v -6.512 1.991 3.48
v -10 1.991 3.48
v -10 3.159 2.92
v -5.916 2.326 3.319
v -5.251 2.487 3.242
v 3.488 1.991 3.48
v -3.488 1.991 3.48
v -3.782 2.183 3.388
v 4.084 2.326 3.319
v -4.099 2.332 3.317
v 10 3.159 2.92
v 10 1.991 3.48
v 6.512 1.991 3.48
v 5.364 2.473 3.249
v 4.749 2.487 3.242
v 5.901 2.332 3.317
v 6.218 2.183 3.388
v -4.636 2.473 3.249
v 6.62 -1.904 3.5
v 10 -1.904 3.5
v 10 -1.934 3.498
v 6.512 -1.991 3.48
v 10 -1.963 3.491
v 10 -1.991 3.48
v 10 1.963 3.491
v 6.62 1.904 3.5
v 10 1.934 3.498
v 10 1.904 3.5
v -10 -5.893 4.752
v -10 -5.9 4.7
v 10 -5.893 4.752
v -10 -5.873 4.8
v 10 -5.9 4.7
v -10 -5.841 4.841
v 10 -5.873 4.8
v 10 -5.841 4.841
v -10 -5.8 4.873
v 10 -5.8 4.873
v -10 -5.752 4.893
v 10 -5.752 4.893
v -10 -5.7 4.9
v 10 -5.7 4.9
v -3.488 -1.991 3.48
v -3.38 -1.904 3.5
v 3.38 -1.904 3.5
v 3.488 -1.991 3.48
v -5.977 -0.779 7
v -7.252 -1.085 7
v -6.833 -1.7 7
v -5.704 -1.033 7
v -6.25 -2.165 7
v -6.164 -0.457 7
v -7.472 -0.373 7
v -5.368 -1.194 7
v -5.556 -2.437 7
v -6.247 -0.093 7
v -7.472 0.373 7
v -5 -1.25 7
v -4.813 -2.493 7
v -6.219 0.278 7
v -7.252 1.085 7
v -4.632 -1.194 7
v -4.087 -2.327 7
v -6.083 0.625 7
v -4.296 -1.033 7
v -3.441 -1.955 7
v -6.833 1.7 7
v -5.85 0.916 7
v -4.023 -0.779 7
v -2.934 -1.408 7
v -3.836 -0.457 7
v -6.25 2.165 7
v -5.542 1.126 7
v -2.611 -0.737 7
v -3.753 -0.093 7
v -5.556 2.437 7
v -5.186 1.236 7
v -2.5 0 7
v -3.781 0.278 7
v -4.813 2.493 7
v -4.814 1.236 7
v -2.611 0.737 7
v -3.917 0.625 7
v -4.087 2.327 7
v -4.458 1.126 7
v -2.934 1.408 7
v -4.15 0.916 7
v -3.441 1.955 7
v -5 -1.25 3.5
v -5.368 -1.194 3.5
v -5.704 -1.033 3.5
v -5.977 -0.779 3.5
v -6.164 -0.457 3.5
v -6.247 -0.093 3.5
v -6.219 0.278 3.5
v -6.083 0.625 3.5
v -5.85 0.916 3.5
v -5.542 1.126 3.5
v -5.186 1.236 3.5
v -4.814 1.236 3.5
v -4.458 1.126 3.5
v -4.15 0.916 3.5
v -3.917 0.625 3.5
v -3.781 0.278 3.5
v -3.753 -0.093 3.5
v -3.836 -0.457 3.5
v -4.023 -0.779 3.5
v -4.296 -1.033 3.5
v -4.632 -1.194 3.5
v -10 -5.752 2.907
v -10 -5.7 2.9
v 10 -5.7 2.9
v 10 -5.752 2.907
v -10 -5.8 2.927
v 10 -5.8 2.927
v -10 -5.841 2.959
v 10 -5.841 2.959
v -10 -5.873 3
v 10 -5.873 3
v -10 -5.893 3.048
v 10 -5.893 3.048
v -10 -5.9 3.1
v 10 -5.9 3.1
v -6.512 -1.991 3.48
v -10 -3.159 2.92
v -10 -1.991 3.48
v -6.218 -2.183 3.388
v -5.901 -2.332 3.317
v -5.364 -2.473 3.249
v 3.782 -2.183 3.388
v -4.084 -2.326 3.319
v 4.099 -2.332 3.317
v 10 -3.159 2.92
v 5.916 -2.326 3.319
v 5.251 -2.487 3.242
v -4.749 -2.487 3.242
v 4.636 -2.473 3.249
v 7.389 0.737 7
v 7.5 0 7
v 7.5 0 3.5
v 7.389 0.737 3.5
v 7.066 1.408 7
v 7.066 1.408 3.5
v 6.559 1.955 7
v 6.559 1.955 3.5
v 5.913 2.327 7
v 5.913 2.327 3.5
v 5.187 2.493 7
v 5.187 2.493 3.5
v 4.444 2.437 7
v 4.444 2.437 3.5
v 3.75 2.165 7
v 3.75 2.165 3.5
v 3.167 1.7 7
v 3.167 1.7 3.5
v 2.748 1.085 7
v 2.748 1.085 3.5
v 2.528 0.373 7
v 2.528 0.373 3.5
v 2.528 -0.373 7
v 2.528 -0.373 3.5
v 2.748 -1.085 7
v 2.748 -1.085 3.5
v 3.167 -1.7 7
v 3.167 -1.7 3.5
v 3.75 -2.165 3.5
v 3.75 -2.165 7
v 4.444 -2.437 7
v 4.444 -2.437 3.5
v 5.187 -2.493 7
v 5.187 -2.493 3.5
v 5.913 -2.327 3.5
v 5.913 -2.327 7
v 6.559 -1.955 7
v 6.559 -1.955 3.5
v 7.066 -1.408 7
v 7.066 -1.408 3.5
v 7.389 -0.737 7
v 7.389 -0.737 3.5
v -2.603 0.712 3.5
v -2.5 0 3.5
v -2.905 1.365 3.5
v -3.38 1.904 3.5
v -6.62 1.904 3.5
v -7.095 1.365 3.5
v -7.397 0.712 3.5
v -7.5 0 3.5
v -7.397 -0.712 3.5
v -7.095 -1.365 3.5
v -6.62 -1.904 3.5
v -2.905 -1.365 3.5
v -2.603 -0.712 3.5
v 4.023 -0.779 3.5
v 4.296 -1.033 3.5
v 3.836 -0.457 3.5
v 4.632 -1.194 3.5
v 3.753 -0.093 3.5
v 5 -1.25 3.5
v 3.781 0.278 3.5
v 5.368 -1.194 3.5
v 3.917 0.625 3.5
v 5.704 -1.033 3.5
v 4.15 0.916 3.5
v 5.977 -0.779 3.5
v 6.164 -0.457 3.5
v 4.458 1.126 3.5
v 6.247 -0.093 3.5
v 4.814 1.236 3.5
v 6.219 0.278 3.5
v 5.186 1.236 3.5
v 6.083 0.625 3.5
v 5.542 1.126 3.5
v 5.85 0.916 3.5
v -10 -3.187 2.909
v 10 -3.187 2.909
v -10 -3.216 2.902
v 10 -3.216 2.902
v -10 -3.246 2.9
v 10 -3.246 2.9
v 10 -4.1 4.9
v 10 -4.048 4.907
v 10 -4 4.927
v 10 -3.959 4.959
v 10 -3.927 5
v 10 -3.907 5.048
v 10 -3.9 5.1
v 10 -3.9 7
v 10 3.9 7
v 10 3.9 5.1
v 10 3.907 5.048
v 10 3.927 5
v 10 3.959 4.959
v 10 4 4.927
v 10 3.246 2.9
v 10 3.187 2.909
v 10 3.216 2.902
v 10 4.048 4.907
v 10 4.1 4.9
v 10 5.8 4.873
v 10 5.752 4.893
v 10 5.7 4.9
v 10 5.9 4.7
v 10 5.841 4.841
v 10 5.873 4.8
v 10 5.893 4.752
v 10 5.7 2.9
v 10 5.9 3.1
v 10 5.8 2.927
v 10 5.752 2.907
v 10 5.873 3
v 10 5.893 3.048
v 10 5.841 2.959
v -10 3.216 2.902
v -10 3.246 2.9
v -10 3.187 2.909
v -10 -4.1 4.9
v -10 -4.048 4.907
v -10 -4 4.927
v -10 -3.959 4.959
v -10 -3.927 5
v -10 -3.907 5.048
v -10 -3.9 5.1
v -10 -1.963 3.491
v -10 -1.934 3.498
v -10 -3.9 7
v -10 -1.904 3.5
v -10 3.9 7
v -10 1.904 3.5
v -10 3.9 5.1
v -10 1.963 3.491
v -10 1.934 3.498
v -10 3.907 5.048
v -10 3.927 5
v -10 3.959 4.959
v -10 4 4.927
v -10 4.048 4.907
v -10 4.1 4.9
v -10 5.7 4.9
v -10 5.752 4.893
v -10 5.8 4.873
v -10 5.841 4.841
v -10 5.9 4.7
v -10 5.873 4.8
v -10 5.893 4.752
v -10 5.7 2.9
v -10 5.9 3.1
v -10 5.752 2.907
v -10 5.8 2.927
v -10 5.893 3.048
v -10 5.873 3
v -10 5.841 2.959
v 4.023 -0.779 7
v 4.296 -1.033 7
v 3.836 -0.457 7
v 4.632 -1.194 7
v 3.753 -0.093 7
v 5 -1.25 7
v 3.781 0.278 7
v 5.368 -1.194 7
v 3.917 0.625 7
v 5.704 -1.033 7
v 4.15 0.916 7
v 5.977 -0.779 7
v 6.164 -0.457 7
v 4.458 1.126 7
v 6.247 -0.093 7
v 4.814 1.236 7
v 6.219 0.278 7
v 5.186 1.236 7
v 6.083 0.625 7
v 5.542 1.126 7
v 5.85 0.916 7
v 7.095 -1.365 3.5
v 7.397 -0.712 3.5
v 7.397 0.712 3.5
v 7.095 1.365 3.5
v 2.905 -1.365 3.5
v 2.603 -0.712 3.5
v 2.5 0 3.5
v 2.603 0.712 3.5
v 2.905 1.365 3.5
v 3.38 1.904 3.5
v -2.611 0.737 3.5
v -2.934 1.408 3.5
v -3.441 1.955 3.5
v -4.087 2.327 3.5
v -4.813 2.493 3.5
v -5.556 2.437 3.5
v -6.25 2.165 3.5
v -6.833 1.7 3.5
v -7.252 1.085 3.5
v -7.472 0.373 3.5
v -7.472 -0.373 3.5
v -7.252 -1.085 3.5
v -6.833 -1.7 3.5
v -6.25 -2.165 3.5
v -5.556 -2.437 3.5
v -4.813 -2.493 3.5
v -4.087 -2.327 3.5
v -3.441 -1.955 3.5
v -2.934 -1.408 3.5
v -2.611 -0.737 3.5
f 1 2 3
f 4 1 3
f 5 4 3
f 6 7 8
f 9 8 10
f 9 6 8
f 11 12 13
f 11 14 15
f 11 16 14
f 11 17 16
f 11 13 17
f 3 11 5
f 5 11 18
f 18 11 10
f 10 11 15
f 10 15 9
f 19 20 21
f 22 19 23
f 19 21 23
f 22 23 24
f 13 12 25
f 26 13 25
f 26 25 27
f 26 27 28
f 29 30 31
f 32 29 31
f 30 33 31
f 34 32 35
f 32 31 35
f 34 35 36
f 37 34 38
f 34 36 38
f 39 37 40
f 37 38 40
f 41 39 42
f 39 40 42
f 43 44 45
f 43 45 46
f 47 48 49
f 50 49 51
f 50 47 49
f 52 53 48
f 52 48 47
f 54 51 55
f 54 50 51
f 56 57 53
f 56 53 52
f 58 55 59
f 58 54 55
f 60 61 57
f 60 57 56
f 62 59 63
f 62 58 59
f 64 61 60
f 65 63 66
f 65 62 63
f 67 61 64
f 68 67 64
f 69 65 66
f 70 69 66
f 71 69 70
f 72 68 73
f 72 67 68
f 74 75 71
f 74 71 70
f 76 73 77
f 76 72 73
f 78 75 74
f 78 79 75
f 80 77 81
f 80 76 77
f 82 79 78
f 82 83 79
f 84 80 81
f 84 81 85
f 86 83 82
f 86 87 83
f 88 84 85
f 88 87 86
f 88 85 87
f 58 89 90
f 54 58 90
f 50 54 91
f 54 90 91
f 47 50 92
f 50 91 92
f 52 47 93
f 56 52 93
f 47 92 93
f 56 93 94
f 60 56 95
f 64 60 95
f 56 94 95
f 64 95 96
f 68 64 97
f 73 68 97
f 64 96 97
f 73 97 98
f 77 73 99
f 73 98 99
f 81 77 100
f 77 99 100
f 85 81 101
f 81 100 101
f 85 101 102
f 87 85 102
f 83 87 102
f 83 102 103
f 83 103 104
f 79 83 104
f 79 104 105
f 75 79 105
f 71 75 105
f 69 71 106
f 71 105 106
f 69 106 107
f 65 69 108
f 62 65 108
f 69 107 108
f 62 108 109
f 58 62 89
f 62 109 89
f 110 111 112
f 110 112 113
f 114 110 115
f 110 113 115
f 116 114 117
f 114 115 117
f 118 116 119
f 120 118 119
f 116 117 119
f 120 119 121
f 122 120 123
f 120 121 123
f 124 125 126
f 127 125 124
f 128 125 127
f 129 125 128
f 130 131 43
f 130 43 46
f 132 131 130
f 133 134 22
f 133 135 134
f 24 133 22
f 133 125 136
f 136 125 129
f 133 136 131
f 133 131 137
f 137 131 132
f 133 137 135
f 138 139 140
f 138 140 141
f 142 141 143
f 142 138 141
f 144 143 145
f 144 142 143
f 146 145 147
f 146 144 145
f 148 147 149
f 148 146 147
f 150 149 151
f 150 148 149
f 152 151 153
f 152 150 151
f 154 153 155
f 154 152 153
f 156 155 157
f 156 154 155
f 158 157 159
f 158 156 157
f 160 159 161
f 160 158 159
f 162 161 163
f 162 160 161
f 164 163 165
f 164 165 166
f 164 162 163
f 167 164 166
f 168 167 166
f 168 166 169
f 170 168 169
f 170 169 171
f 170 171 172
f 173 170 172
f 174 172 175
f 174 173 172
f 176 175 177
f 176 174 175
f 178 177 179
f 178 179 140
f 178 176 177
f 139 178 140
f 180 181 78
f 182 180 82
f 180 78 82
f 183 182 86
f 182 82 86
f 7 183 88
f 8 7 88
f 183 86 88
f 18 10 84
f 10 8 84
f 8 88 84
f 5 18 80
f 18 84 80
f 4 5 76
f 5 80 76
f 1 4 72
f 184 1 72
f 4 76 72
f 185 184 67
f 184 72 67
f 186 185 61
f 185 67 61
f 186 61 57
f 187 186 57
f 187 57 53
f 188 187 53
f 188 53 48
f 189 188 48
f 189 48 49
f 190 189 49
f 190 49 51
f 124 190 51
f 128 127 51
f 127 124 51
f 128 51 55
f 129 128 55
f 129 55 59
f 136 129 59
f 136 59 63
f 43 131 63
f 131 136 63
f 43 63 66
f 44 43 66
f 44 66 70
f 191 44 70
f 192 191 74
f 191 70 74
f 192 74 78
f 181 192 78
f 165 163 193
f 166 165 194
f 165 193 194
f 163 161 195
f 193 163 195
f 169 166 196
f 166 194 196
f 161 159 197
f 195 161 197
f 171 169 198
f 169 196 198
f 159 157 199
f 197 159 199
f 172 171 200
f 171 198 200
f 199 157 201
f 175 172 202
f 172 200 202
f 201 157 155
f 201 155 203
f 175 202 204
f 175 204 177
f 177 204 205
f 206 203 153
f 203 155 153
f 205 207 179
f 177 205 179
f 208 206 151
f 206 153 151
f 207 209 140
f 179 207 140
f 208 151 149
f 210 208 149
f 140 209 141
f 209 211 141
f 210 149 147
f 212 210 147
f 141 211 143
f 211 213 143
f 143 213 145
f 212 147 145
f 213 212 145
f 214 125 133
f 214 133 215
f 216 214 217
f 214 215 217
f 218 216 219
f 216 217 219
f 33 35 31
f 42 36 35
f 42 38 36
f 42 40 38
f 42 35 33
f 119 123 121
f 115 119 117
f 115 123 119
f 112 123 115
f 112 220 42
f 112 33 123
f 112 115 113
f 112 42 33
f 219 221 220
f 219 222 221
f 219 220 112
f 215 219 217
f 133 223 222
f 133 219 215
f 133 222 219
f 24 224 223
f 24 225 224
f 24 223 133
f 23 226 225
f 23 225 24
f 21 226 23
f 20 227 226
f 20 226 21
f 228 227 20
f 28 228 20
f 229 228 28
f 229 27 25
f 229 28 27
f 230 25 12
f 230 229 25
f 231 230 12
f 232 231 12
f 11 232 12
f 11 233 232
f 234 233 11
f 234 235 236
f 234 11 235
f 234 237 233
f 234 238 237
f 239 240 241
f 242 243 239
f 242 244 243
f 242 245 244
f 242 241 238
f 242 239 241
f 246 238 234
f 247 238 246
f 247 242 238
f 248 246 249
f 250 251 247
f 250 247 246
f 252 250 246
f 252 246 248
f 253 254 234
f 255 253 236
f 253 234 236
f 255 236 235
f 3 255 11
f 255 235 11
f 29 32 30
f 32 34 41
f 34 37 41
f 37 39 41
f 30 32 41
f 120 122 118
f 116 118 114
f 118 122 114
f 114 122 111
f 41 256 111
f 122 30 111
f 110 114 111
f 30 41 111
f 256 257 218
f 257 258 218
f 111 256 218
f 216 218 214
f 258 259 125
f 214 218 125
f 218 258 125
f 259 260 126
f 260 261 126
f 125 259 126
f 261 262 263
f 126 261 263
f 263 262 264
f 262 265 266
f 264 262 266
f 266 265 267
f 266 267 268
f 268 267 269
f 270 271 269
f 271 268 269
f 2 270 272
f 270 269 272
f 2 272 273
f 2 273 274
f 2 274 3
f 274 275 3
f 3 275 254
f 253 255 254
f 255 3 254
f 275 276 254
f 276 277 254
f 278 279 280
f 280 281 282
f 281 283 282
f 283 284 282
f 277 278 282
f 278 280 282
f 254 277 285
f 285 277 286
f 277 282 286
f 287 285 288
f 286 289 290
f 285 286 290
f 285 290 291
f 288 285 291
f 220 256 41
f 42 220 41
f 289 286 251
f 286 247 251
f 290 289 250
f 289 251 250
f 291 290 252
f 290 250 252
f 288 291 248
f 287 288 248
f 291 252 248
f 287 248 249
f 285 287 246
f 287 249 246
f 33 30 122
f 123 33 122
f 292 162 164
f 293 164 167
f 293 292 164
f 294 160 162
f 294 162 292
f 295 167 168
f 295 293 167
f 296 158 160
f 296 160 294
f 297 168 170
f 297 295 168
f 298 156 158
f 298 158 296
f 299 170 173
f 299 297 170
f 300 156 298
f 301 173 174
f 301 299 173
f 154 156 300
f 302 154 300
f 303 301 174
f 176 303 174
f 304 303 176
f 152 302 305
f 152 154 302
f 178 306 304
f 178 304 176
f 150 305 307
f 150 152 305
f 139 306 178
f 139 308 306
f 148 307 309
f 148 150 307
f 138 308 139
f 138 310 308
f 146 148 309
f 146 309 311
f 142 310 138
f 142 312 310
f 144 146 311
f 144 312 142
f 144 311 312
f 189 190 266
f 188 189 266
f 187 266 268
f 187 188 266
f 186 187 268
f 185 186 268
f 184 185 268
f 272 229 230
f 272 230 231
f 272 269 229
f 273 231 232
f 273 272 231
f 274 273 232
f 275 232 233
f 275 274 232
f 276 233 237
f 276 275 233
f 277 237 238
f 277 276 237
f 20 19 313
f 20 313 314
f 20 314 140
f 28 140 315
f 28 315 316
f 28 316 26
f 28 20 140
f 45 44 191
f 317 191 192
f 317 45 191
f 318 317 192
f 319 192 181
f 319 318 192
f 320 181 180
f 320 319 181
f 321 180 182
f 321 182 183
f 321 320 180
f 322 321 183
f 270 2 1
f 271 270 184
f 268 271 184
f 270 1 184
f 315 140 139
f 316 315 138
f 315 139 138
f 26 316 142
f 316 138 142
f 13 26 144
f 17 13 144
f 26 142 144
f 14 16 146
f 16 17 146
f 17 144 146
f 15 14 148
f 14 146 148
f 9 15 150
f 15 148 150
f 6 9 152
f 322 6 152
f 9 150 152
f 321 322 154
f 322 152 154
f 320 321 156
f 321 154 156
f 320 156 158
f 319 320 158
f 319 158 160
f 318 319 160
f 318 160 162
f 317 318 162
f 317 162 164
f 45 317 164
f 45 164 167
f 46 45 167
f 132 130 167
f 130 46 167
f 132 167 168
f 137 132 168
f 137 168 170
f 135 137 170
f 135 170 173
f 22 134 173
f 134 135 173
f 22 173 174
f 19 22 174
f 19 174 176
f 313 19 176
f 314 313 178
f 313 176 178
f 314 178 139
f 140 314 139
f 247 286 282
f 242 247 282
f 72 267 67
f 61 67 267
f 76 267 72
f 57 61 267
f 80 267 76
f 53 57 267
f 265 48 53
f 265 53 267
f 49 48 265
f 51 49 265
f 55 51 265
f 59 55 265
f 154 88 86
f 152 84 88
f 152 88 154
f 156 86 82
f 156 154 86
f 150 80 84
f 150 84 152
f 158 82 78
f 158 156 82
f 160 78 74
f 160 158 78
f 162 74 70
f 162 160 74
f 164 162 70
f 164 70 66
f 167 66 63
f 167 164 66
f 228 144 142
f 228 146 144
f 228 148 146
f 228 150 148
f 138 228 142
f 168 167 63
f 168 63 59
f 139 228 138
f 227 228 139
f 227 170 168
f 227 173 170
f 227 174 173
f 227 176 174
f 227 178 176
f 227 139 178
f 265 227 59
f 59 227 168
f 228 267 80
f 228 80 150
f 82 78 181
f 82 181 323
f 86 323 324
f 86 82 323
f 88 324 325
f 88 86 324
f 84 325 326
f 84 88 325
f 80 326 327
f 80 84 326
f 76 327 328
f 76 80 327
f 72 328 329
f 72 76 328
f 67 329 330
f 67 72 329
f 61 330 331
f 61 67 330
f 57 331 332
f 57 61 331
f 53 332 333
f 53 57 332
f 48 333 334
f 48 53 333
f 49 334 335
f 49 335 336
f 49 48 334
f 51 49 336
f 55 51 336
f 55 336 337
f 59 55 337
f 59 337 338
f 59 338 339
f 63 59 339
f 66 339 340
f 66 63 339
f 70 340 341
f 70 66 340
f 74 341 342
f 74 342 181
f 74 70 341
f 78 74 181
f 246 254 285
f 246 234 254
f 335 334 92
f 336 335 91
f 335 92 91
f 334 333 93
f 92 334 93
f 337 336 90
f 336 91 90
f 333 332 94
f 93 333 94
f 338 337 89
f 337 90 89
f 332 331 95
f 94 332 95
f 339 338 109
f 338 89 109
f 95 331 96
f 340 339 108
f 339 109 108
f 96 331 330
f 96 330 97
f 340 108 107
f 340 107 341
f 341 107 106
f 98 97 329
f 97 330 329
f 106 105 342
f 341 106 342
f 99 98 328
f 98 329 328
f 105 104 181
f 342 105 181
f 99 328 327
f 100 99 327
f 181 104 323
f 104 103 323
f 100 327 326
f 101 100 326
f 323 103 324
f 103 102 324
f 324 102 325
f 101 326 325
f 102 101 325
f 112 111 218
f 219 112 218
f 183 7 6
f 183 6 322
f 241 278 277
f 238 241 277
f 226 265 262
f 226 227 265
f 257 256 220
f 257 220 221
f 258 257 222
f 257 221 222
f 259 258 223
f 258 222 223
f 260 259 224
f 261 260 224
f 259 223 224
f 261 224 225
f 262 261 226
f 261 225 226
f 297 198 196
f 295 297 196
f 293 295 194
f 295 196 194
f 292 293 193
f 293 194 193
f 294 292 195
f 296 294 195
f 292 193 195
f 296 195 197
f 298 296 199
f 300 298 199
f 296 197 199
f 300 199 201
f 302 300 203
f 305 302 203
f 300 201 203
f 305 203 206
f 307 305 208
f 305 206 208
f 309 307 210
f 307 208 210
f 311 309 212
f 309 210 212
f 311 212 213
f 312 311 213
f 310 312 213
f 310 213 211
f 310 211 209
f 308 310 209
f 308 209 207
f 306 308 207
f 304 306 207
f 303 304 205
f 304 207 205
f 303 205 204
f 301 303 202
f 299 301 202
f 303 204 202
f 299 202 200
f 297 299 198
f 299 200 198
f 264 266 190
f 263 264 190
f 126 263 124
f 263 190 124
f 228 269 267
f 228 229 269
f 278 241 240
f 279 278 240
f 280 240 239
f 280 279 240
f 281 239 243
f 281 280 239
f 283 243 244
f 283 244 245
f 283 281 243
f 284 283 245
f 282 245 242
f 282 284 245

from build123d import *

# Parameters (mm, degrees)
EXTRUDE_1_DEPTH             = 10
FILLET_1_R                  = 0.2
SKETCH_4_R                  = 2.5
CUT_EXTRUDE_1_DEPTH         = 13.313407327
SKETCH_5_R                  = 2.5
EXTRUDE_2_DEPTH             = 3.5
EXTRUDE_2_2_DEPTH           = 3.5
SKETCH_3_W                  = 1.25
SKETCH_3_H                  = 4.1
HOLE_WIZARD_M3_1_AT_2_COUNT = 2
HOLE_WIZARD_M3_1_AT_2_PITCH = 10


with BuildPart() as part:
    # 草图1 → 凸台-拉伸1 (new, symmetric)
    with BuildSketch(Plane(origin=(0, 0, 0), x_dir=(0, 0, -1), z_dir=(1, 0, 0))):
        Polygon((-7, 3.9), (-7, -3.9), (-4.9, -3.9), (-4.9, -5.9), (-2.9, -5.9), (-2.9, -3.2), (-3.5, -1.95), (-3.5, 1.95), (-2.9, 3.2), (-2.9, 5.9), (-4.9, 5.9), (-4.9, 3.9), align=None)
    extrude(amount=EXTRUDE_1_DEPTH, both=True)

    # 圆角1
    fillet_1_edges = [part.edges().sort_by_distance(p)[0] for p in [
        (0, 3.9, 4.9),
        (0, 5.9, 4.9),
        (0, 5.9, 2.9),
        (0, 3.2, 2.9),
        (0, 1.95, 3.5),
        (0, -1.95, 3.5),
        (0, -3.2, 2.9),
        (0, -5.9, 2.9),
        (0, -5.9, 4.9),
        (0, -3.9, 4.9),
    ]]
    fillet(fillet_1_edges, radius=FILLET_1_R)

    # 草图4 → 切除-拉伸1 (cut, through all)
    with BuildSketch(Plane.XY.offset(7)):
        with Locations((-5, 0)):
            Circle(SKETCH_4_R)
        with Locations((5, 0)):
            Circle(SKETCH_4_R)
    extrude(amount=-CUT_EXTRUDE_1_DEPTH, mode=Mode.SUBTRACT)


with BuildPart() as body_2:
    # 草图5 → 凸台-拉伸2 (new body)
    with BuildSketch(Plane.XY.offset(7)):
        with Locations((5, 0)):
            Circle(SKETCH_5_R)
    extrude(amount=-EXTRUDE_2_DEPTH)


with BuildPart() as body_3:
    # 草图5 → Extrude 2 2 (new body)
    with BuildSketch(Plane.XY.offset(7)):
        with Locations((-5, 0)):
            Circle(SKETCH_5_R)
    extrude(amount=-EXTRUDE_2_2_DEPTH)

    # 草图3 → M3 螺纹孔1 (revolve, cut)
    with BuildSketch(Plane(origin=(-5, 0, 7), x_dir=(0, -1, 0), z_dir=(1, 0, 0))):
        with Locations((0.625, 2.05)):
            Rectangle(SKETCH_3_W, SKETCH_3_H)
    hole_wizard_m3_1 = revolve(axis=Axis((-5, 0, 13.35), (0, 0, -1)), mode=Mode.SUBTRACT)


with BuildPart() as body_2_1:
    add(body_2.part)

    # M3 螺纹孔1 at 2: M3 螺纹孔1 ×2
    with Locations(*[(i * HOLE_WIZARD_M3_1_AT_2_PITCH, 0, 0) for i in range(1, HOLE_WIZARD_M3_1_AT_2_COUNT)]):
        add(hole_wizard_m3_1, mode=Mode.SUBTRACT)


solid = Compound([part.part, body_3.part, body_2_1.part])
